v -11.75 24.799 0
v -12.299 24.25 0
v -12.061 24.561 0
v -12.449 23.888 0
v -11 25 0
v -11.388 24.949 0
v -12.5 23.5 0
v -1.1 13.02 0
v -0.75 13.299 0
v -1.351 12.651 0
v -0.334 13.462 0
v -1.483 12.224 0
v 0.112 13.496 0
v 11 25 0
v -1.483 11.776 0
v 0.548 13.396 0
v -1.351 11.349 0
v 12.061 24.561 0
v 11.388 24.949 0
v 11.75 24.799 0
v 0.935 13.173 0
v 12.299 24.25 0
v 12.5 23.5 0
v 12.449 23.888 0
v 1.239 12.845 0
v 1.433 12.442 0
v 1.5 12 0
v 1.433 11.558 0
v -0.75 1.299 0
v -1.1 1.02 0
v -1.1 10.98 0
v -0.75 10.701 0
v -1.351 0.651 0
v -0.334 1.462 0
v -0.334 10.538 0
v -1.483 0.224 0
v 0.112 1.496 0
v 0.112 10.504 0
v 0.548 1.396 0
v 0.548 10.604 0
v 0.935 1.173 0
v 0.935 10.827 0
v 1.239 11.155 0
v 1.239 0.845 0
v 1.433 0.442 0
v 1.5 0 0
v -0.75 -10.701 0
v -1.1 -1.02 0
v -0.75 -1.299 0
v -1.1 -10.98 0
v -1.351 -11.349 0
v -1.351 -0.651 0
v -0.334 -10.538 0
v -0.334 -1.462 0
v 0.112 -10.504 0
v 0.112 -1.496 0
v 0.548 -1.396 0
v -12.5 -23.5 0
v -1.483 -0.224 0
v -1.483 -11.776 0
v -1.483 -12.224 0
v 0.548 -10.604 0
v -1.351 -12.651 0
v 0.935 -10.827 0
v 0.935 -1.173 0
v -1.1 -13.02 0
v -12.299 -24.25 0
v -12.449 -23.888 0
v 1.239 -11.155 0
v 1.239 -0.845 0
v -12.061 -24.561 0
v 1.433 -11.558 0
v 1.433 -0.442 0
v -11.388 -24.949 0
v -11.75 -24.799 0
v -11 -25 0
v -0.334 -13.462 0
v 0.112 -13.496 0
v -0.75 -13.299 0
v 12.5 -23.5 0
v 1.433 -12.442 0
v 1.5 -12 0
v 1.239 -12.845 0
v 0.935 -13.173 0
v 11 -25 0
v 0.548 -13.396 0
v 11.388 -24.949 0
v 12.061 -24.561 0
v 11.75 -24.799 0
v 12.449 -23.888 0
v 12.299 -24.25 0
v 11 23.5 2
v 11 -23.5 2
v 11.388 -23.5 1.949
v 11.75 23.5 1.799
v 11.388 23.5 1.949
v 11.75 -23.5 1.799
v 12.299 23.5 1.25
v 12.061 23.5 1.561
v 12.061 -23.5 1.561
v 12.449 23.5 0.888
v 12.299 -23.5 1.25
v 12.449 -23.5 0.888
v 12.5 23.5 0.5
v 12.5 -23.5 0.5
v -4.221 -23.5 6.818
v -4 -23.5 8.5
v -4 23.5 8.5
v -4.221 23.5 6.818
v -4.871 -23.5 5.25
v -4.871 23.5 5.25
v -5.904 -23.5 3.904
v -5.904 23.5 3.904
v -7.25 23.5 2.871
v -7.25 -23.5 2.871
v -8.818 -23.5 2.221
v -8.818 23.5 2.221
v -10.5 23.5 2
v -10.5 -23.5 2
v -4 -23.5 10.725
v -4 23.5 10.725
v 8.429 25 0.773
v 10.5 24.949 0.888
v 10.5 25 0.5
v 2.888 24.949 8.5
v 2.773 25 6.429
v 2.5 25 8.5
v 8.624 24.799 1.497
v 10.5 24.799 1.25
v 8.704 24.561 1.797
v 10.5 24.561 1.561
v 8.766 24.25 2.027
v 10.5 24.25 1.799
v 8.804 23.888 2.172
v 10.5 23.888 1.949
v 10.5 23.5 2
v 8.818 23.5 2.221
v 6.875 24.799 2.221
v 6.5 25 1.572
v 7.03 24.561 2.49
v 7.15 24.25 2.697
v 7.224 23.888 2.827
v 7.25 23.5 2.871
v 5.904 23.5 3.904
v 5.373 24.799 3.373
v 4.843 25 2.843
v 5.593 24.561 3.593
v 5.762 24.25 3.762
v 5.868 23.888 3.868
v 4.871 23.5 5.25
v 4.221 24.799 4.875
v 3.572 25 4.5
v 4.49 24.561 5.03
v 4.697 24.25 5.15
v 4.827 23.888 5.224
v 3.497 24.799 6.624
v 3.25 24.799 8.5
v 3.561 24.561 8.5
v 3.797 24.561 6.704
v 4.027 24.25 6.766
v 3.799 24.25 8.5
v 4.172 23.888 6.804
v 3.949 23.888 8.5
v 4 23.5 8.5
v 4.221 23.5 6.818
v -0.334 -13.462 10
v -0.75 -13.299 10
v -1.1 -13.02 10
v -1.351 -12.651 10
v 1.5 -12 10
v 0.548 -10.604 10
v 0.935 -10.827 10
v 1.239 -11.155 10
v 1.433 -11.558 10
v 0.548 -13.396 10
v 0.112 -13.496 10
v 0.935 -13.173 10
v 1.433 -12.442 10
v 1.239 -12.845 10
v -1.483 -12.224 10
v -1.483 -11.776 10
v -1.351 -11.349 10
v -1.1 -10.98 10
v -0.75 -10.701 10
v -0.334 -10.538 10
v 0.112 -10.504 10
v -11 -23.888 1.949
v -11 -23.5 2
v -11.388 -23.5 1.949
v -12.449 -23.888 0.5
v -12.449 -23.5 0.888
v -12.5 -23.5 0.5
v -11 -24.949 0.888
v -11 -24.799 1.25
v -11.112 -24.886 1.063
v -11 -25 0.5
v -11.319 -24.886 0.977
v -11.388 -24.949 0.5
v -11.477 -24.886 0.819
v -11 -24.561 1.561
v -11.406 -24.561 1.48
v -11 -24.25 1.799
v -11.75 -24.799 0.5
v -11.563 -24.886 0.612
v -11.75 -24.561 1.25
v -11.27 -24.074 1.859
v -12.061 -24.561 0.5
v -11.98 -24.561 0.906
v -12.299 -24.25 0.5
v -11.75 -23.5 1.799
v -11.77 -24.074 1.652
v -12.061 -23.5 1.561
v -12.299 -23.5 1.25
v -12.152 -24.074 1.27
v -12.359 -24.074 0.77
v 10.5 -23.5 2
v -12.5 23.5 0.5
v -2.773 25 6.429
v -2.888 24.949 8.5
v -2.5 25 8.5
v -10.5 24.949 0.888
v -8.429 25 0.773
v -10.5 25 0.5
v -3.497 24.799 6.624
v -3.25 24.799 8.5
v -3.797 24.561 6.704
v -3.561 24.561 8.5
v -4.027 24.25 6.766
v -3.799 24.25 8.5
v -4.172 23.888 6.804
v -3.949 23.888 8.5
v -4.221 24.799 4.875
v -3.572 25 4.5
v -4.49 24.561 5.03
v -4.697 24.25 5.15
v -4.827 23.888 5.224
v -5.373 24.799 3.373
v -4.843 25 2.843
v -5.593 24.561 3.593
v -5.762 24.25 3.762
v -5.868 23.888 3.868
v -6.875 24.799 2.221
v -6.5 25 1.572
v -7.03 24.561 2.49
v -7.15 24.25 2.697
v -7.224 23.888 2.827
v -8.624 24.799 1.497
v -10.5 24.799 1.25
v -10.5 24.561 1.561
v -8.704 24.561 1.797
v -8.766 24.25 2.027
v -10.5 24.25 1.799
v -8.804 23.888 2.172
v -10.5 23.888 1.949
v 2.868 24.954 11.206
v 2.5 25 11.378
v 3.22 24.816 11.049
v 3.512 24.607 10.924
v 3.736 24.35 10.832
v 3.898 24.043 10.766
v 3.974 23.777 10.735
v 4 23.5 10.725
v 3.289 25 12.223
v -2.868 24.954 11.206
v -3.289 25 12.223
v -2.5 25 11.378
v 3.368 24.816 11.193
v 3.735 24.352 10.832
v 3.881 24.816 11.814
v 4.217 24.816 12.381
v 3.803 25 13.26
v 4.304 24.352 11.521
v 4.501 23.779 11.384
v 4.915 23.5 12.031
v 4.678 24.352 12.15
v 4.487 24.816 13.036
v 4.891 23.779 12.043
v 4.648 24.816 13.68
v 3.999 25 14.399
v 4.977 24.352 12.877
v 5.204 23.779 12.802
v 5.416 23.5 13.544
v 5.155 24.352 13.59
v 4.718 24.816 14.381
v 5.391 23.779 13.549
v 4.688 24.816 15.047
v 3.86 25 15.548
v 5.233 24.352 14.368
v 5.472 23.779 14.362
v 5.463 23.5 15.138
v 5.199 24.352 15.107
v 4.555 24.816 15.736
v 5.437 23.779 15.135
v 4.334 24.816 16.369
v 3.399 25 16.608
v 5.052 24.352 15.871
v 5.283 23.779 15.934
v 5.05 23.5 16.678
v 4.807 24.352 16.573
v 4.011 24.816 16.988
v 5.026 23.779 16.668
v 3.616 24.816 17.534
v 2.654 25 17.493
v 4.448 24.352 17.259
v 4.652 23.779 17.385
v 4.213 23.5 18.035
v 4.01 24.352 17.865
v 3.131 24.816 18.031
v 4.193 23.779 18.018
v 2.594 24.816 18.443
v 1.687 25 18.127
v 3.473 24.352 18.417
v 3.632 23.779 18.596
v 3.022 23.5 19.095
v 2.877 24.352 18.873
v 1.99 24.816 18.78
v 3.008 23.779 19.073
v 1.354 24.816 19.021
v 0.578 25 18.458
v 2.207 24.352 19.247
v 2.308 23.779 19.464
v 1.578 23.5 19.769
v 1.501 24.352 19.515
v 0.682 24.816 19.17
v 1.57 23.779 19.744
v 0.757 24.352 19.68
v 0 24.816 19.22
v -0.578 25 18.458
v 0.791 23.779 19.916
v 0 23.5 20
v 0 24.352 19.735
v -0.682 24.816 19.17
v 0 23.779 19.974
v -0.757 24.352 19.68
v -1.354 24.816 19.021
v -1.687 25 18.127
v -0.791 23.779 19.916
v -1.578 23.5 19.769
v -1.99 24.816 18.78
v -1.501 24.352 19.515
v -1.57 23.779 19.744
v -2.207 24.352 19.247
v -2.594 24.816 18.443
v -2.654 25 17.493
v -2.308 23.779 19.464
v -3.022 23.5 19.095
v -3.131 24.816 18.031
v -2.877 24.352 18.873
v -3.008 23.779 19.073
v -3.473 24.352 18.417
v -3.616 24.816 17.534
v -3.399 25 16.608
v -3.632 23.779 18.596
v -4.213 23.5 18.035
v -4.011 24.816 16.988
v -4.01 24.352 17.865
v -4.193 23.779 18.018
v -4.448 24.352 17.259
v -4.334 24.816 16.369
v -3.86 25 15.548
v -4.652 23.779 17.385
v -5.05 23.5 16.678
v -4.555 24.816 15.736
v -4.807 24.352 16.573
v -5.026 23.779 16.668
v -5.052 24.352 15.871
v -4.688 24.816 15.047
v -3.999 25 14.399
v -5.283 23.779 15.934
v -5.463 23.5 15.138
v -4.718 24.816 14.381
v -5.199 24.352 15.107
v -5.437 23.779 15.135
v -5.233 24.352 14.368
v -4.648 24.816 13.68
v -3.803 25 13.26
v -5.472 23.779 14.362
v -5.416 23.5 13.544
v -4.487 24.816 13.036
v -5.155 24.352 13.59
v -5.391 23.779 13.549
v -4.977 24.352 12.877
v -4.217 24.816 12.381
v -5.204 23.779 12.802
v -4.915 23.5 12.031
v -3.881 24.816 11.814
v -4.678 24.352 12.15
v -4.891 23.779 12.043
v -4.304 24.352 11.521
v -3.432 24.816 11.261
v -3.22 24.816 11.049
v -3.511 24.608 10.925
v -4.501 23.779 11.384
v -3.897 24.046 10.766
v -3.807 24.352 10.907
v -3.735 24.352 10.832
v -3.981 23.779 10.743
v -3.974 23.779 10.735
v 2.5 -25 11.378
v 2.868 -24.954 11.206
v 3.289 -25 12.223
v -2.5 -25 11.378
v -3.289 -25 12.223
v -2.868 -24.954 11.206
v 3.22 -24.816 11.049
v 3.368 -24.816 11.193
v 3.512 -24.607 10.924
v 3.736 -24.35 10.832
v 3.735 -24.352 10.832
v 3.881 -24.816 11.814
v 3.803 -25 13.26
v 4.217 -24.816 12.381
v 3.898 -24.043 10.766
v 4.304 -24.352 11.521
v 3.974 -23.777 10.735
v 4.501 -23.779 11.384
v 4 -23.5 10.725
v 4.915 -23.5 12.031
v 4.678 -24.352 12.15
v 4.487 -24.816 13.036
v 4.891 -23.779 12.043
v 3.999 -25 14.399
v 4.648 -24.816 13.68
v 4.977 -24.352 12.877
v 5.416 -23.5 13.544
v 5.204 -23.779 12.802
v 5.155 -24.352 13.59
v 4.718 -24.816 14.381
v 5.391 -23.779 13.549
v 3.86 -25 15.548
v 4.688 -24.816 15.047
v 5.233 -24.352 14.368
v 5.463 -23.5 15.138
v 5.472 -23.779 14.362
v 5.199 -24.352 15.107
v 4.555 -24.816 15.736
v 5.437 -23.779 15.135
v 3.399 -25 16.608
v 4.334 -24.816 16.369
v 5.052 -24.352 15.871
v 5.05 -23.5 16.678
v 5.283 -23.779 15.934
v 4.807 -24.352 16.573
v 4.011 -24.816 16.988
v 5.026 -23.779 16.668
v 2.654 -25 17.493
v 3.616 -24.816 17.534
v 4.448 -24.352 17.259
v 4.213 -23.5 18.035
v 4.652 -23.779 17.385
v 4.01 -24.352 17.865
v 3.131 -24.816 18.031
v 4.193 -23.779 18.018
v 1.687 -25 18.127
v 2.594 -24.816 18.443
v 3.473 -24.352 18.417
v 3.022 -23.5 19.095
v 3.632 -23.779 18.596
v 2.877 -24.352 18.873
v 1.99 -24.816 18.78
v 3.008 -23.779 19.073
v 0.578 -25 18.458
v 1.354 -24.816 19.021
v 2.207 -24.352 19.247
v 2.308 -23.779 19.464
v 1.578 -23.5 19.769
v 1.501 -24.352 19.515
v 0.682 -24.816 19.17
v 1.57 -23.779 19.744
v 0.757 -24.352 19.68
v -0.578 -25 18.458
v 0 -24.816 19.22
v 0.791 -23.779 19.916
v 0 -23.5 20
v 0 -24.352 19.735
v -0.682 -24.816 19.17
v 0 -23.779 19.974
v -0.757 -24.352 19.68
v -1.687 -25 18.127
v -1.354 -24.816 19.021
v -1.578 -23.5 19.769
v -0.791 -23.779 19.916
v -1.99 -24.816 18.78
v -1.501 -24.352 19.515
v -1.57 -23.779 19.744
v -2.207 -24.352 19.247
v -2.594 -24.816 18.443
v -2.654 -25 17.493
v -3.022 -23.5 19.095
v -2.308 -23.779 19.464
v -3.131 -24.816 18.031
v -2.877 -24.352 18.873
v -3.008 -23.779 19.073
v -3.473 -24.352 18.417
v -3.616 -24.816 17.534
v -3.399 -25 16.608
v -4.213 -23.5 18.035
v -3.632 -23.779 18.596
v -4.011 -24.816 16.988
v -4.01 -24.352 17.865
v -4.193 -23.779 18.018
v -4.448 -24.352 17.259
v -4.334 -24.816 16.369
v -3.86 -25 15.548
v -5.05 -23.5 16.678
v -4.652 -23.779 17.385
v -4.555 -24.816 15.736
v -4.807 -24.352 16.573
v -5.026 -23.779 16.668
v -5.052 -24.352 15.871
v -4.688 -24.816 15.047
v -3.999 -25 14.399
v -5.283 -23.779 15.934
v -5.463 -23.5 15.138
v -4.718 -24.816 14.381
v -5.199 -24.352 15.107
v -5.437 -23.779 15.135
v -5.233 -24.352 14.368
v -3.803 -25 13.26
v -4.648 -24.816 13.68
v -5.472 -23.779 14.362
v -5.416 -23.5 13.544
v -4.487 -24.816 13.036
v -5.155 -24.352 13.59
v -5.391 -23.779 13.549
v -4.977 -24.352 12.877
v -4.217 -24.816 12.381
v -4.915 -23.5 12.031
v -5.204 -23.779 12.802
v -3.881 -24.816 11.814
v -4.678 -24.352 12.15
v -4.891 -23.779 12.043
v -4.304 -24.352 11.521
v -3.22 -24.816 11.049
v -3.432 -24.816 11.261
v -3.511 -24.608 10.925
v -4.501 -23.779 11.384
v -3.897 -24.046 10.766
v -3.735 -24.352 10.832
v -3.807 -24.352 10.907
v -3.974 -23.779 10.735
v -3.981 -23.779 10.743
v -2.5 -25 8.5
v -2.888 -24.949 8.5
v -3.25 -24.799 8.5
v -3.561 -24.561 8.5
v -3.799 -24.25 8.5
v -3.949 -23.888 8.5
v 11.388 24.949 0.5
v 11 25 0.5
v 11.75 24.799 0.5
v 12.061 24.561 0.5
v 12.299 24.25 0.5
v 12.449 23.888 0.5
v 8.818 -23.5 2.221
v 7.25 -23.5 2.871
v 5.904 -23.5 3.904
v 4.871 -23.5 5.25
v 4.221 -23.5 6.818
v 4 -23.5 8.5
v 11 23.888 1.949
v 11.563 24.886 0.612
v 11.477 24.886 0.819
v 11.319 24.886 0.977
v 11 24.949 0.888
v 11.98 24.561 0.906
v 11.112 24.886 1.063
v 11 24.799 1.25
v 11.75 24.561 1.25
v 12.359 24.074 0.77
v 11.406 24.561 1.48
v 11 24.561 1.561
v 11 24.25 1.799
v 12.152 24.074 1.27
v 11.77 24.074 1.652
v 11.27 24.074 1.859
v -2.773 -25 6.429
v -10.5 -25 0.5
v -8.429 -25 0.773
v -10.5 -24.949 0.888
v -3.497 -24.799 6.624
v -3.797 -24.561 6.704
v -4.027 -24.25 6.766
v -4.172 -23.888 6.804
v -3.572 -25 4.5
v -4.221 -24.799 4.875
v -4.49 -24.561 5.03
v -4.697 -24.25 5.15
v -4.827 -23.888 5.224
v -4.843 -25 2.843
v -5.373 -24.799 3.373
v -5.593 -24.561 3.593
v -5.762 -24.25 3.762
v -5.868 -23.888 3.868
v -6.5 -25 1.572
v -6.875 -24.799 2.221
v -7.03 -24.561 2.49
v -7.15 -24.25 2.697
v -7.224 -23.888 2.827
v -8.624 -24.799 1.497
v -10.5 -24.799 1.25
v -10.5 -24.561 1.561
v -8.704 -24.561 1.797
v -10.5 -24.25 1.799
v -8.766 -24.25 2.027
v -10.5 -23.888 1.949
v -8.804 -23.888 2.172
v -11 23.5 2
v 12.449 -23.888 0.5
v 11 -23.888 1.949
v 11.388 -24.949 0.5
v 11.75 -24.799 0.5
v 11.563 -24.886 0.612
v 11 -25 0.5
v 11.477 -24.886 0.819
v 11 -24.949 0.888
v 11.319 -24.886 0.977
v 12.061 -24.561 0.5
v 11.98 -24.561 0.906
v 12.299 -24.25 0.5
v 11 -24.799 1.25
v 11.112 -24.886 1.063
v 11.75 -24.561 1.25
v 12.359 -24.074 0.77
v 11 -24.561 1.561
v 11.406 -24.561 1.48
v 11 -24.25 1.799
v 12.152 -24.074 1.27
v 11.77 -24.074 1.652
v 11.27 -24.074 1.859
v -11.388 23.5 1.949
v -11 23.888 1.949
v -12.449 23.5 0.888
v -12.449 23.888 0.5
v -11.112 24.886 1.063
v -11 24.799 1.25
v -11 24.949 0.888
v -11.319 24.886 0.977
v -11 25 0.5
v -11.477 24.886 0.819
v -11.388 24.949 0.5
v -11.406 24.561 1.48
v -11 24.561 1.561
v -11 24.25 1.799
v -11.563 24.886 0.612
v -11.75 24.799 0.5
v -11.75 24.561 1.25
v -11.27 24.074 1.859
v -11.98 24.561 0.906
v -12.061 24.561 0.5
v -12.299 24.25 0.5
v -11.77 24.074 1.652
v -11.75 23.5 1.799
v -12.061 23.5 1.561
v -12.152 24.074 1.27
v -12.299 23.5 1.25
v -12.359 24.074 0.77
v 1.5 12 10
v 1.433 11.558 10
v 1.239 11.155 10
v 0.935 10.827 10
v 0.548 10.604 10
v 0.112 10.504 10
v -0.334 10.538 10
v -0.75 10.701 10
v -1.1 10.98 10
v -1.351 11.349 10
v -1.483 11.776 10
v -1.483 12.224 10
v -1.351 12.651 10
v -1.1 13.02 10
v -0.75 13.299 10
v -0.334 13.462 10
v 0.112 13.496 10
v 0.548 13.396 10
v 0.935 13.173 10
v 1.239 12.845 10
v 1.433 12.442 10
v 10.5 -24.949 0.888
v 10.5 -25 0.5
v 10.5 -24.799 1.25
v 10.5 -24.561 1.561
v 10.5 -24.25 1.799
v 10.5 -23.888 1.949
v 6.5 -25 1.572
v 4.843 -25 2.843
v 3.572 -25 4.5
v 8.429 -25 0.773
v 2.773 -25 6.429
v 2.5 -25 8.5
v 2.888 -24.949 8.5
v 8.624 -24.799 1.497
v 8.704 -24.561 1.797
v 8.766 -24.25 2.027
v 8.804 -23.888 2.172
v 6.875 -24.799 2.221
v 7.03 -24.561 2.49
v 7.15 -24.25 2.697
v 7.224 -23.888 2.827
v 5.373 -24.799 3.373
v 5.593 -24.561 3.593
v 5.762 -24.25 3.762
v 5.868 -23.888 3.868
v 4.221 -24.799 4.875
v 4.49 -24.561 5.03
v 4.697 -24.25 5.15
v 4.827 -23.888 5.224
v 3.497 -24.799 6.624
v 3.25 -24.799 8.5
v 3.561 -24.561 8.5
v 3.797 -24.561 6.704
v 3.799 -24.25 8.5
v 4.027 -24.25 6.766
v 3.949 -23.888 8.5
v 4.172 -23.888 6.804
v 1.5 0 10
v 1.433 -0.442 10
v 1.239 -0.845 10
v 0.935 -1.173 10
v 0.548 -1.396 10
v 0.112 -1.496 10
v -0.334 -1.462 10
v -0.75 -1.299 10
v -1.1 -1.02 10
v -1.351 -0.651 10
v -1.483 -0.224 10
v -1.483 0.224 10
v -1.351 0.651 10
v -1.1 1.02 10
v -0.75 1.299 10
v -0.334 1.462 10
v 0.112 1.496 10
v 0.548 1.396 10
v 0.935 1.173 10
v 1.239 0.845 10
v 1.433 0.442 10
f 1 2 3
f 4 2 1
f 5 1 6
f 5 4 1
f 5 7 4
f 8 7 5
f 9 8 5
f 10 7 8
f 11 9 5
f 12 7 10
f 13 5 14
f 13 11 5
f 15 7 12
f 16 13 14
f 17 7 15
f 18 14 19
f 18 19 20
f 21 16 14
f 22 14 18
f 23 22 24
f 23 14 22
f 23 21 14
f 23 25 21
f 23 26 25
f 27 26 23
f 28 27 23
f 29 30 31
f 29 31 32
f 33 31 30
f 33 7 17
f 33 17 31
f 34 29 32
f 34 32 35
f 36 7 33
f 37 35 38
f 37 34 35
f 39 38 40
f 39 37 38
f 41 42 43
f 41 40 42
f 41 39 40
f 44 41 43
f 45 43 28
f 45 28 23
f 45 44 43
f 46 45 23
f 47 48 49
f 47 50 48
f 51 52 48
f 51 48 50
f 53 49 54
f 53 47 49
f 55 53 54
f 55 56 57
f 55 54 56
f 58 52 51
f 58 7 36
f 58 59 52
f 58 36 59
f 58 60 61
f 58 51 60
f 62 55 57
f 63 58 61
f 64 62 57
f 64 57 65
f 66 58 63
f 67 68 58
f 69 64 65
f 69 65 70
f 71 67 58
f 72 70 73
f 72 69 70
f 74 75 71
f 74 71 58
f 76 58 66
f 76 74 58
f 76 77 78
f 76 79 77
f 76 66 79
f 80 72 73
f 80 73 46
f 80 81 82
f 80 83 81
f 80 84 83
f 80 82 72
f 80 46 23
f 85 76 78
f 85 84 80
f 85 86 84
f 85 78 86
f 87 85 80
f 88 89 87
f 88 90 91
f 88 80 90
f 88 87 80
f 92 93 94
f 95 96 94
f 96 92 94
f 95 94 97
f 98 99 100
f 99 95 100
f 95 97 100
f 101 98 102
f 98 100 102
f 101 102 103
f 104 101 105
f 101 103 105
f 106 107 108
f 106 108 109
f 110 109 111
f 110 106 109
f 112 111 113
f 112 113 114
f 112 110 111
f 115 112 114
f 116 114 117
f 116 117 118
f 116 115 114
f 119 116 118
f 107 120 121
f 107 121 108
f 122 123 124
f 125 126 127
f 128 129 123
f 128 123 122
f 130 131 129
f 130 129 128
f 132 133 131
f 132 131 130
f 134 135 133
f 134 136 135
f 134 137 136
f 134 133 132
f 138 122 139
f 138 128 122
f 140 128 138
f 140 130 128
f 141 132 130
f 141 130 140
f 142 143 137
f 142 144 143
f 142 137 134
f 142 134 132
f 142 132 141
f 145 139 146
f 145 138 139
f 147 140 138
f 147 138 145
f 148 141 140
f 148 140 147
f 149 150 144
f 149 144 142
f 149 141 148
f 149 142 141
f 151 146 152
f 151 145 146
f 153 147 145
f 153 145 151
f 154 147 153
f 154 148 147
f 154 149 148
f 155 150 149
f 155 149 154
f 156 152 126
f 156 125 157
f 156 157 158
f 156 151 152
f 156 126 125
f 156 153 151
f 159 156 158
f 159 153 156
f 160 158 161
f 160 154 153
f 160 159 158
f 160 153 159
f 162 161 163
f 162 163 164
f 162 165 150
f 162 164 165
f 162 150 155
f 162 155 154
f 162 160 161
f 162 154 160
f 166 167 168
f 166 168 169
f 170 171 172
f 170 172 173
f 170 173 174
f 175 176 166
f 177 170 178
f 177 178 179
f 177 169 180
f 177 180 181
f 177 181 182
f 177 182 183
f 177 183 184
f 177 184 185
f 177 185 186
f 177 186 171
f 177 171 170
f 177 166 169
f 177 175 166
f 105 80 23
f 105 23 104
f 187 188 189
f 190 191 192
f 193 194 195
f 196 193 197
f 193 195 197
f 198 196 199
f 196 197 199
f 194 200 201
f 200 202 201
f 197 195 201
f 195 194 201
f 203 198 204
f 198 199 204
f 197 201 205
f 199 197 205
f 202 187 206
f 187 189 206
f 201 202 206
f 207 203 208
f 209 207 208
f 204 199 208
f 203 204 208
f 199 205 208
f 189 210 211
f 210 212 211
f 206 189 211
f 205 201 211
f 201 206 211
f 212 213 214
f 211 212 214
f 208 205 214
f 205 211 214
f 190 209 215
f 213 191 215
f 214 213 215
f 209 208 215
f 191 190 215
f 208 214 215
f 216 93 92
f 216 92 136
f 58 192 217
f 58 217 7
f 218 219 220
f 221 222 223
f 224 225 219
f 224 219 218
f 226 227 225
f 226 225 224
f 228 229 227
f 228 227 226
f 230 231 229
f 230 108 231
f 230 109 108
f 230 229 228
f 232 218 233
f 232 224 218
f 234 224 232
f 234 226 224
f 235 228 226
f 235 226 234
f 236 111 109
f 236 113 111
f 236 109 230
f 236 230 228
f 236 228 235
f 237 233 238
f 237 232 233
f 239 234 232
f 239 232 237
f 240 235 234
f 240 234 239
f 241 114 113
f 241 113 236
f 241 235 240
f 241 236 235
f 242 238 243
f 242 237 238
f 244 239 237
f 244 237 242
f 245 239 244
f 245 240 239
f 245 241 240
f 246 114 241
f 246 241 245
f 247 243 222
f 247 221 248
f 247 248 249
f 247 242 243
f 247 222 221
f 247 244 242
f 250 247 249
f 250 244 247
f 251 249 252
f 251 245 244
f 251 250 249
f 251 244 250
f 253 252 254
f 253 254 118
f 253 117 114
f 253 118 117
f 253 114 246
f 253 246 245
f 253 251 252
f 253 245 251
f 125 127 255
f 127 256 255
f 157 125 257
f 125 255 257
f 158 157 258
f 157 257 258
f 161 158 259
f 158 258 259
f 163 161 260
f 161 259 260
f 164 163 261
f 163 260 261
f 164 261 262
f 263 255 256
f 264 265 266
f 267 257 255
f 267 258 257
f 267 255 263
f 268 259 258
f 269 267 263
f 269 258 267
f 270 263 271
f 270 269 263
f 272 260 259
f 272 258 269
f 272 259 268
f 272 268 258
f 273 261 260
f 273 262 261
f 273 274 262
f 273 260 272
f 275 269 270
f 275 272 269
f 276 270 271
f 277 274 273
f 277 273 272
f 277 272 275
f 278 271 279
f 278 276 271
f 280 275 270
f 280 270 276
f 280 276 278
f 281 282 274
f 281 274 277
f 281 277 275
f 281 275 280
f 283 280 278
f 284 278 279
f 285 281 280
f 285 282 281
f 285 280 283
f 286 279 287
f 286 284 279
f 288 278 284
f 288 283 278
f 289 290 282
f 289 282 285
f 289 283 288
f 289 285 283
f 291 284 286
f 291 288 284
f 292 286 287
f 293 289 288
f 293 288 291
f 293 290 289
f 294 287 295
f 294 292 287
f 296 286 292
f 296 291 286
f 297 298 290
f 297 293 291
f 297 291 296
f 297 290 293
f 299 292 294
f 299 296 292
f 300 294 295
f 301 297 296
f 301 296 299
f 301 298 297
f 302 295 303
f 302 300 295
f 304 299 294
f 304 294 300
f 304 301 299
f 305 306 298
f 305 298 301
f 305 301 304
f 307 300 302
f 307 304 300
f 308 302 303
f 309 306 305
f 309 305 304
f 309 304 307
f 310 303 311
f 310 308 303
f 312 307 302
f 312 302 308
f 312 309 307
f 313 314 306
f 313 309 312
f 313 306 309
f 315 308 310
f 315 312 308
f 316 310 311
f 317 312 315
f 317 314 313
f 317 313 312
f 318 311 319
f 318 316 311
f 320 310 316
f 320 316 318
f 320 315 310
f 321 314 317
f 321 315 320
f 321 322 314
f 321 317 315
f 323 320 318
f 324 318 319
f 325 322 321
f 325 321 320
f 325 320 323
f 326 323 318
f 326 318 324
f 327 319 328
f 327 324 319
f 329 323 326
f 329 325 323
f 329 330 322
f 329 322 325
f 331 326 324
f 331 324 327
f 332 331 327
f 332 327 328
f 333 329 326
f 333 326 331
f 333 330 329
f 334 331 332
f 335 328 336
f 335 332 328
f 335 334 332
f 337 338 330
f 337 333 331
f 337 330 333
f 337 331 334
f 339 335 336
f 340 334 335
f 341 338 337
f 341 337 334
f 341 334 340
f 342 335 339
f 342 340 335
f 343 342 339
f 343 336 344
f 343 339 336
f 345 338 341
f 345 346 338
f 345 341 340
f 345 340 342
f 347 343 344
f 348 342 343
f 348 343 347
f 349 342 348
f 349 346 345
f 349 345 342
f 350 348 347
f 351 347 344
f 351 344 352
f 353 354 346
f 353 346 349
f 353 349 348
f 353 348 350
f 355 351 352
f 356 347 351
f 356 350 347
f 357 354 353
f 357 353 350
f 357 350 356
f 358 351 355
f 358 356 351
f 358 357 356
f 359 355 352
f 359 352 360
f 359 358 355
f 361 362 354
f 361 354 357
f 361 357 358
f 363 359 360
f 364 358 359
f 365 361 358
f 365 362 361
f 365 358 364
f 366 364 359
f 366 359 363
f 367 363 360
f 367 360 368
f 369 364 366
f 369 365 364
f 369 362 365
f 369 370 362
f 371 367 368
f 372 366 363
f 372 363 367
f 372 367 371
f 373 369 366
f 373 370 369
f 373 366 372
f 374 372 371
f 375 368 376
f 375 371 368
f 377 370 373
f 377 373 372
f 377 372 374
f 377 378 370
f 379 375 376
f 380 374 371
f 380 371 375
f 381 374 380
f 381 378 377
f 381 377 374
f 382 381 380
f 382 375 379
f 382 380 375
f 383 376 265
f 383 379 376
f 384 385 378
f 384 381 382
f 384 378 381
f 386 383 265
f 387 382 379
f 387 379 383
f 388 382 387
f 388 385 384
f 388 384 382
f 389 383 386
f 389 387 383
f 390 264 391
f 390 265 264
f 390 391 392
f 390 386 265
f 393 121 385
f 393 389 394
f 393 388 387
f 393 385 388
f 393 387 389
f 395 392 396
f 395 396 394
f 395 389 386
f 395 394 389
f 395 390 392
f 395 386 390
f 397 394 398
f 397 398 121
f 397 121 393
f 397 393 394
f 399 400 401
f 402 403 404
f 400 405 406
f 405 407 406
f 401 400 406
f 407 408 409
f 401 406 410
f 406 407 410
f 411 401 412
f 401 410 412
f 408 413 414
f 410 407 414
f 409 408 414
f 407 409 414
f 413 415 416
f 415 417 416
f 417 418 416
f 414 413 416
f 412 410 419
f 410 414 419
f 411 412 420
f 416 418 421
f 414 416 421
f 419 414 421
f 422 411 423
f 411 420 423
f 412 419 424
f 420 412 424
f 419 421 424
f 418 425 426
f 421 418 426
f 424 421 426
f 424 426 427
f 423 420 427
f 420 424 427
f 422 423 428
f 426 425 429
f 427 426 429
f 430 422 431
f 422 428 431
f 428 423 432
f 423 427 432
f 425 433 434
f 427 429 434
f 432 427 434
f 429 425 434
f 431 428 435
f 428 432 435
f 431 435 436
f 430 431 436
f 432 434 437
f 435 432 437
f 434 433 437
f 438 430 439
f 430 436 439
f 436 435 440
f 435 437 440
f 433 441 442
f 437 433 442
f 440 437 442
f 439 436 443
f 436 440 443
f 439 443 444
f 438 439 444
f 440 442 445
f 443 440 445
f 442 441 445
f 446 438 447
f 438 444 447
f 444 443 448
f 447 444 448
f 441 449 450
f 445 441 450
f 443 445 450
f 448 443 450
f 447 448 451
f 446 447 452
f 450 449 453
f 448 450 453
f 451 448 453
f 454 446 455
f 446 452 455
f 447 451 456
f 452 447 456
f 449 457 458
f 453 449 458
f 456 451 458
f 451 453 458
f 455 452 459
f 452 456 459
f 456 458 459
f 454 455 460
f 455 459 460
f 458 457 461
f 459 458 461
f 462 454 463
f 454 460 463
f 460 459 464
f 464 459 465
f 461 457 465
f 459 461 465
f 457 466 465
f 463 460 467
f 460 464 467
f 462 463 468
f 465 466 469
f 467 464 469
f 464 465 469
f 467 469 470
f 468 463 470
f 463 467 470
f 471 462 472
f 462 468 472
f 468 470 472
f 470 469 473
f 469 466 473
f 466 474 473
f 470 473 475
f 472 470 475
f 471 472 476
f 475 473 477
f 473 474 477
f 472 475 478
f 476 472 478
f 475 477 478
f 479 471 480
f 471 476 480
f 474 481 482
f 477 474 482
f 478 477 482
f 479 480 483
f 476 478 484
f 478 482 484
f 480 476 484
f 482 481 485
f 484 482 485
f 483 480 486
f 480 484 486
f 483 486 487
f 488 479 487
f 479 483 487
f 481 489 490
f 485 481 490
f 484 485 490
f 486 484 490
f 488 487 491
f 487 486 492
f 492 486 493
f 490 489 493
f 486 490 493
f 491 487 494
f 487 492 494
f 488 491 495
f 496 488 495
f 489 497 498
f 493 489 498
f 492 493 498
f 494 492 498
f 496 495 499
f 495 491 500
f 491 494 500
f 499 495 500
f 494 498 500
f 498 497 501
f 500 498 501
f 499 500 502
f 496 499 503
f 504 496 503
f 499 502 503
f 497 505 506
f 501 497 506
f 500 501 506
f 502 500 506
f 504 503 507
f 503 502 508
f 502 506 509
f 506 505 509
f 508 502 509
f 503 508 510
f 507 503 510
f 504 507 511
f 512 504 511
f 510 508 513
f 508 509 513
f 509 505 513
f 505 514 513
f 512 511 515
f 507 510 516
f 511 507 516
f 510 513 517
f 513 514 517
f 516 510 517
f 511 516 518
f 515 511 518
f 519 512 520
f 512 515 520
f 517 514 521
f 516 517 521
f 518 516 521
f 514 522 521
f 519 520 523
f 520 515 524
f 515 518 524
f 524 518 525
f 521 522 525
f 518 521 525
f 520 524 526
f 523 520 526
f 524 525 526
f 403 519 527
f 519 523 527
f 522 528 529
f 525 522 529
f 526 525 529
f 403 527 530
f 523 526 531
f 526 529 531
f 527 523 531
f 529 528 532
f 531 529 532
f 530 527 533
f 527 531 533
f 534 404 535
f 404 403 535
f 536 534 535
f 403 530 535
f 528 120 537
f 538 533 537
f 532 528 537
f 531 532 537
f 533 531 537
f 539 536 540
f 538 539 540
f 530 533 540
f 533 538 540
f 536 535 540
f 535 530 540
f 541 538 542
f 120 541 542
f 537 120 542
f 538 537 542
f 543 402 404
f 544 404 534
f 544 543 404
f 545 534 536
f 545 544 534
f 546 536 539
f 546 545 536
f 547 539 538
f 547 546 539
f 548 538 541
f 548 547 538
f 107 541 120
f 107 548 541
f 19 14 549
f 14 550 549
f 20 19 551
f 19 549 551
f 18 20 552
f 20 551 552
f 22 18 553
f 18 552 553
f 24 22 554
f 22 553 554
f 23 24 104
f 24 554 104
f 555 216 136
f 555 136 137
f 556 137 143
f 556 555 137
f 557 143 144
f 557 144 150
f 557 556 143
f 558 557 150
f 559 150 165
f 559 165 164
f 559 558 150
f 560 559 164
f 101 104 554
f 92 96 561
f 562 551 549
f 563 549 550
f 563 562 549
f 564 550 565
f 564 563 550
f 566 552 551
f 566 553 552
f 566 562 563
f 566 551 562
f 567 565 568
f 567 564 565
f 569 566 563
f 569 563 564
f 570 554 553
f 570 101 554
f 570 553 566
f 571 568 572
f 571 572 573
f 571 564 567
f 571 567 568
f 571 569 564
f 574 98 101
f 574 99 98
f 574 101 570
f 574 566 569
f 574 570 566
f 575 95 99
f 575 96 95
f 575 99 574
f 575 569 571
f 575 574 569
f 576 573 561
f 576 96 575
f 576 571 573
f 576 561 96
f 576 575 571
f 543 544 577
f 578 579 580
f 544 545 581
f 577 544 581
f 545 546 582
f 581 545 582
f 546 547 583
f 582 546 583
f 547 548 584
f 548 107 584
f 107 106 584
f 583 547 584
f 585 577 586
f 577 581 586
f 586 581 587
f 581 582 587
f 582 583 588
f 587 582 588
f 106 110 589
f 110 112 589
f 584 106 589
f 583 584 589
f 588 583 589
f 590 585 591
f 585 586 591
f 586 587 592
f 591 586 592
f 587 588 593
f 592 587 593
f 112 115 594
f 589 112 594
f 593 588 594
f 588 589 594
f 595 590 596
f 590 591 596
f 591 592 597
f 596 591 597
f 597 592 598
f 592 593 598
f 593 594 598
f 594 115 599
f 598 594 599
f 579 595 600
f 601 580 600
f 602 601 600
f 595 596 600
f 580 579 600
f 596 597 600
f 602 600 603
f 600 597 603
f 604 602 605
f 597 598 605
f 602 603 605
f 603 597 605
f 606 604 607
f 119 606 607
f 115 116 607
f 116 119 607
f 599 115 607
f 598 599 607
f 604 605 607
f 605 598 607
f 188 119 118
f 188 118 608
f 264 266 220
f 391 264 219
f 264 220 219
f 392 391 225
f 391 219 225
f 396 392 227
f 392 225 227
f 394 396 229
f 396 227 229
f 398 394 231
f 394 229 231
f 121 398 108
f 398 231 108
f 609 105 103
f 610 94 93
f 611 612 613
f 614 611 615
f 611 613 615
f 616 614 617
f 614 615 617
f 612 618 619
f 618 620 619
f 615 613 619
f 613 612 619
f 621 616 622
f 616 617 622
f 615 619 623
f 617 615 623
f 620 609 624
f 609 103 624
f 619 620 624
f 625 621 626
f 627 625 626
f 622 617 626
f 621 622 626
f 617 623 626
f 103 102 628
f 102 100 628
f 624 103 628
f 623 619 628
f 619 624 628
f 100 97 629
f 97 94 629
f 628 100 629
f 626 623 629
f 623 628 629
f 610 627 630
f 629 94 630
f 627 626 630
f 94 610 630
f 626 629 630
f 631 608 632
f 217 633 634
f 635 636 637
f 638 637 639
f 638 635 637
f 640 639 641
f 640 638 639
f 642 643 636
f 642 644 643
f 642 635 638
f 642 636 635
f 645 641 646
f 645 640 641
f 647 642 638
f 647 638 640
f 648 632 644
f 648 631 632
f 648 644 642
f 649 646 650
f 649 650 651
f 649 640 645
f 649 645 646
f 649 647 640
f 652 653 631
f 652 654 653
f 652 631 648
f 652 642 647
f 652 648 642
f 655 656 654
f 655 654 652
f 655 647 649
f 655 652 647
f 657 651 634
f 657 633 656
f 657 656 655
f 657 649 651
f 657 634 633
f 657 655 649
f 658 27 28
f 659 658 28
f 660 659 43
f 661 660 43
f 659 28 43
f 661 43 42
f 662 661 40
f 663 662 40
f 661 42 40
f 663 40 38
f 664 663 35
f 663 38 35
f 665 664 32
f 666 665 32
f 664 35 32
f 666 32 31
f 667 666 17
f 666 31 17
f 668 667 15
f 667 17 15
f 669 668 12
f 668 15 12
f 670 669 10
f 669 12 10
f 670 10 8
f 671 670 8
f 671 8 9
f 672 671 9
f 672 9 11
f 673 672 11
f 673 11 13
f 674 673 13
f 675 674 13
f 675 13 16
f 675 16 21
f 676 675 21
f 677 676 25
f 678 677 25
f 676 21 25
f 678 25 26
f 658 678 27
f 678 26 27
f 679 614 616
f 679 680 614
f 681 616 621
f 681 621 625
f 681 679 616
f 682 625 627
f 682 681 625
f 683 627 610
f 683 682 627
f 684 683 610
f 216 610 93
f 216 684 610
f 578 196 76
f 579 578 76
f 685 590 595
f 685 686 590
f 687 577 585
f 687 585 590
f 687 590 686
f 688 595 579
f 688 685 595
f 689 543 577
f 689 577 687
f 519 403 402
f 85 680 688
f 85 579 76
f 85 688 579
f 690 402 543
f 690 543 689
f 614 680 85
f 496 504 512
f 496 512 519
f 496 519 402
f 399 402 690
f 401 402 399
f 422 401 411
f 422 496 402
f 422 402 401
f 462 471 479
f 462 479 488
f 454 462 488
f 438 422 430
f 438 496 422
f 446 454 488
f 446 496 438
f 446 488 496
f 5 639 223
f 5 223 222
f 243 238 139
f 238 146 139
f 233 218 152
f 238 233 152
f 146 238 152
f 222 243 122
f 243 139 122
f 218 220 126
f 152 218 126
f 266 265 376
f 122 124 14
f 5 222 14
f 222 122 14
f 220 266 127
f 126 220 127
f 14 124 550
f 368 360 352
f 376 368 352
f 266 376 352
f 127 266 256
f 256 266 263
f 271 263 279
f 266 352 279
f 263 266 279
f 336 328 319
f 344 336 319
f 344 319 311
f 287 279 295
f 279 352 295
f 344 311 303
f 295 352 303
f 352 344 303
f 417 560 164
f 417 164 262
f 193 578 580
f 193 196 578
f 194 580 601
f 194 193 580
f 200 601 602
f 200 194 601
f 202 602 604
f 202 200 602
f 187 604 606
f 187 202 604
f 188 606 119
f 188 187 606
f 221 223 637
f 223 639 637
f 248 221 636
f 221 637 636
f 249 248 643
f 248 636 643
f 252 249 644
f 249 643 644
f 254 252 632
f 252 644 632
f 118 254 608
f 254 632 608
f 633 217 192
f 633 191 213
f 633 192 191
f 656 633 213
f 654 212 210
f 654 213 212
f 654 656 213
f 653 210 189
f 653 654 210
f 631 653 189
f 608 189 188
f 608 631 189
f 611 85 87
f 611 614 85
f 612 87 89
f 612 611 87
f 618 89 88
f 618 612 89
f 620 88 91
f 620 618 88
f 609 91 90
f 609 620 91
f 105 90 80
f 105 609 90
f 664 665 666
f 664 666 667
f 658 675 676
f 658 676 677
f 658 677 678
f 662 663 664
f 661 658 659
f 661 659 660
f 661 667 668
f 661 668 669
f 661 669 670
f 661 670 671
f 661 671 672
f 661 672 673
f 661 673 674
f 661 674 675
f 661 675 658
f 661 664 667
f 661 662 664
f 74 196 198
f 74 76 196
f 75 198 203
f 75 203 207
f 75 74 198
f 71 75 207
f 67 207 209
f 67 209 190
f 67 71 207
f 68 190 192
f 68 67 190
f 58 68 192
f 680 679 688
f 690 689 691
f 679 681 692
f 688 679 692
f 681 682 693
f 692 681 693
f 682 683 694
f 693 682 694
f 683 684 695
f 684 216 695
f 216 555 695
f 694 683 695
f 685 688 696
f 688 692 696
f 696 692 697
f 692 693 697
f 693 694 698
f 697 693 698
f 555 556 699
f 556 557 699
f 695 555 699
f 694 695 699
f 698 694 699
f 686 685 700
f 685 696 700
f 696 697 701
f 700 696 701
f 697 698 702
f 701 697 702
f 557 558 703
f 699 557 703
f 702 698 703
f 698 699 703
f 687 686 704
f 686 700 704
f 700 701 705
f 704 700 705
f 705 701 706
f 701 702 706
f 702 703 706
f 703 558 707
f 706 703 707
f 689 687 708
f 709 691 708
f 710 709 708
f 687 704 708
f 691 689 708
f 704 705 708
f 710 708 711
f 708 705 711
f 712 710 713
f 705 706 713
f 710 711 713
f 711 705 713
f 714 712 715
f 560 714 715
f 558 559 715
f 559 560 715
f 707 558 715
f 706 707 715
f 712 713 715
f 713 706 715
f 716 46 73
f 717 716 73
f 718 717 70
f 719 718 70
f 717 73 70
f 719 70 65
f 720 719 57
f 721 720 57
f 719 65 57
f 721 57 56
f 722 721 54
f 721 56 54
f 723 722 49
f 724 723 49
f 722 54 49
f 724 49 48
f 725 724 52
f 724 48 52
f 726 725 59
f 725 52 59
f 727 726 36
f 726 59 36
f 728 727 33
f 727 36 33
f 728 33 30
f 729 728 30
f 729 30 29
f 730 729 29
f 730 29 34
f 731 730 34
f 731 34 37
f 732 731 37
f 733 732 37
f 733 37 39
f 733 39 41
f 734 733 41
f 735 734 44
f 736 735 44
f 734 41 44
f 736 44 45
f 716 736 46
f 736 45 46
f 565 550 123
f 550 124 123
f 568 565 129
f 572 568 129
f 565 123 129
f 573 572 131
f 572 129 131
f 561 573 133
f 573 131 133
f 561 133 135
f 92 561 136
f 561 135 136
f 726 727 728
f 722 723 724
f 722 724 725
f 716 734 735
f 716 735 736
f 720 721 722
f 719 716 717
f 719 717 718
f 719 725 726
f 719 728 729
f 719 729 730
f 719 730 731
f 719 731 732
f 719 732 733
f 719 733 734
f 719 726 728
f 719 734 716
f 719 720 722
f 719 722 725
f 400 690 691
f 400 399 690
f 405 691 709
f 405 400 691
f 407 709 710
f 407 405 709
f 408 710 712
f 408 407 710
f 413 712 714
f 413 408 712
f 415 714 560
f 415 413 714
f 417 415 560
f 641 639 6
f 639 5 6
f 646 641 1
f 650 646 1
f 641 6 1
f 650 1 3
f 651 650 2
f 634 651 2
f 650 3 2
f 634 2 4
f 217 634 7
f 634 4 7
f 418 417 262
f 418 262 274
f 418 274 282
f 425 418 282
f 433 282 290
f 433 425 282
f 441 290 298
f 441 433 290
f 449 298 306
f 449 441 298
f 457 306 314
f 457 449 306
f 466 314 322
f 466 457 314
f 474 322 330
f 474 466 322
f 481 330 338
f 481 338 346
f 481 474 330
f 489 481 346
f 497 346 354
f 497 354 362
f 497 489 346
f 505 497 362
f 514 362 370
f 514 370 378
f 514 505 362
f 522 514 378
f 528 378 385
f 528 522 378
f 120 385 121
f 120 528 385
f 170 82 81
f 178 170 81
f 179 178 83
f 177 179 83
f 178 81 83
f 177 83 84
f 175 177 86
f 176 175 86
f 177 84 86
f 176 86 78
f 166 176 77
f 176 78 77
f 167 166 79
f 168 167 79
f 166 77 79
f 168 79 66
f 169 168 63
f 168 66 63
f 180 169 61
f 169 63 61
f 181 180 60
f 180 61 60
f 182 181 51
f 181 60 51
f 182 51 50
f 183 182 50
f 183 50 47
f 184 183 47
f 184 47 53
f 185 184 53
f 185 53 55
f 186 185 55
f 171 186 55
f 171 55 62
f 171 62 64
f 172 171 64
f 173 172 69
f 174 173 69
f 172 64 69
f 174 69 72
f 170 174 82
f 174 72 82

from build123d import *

# Parameters (mm, degrees)
F1_DEPTH = 25
F2_R     = 1.5
F3_R     = 1.5
F4_R     = 1.5
F5_DEPTH = 10


with BuildPart() as f1:
    # F0 (on Front) → F1 (new body, symmetric)
    with BuildSketch(Plane.XZ):
        with BuildLine():
            Line((-12.5, 2), (-12.5, 0))
            Line((-12.5, 0), (12.5, 0))
            Line((12.5, 0), (12.5, 2))
            Line((12.5, 2), (10.5, 2))
            ThreePointArc((10.5, 2), (5.9038059223, 3.9038059223), (4, 8.5))
            Line((4, 8.5), (4, 10.7250827824))
            ThreePointArc((4, 10.7250827824), (0, 20), (-4, 10.7250827824))
            Line((-4, 10.7250827824), (-4, 8.5))
            ThreePointArc((-4, 8.5), (-5.9038059223, 3.9038059223), (-10.5, 2))
            Line((-10.5, 2), (-12.5, 2))
        make_face()
    extrude(amount=F1_DEPTH, both=True)

    # F2
    f2_edges = [f1.edges().sort_by_distance(p)[0] for p in [
        (12.5, 0, 2),
        (-12.5, 0, 2),
    ]]
    fillet(f2_edges, radius=F2_R)

    # F3
    f3_edges = [f1.edges().sort_by_distance(p)[0] for p in [
        (0, -25, 20),
        (4, -25, 9.612541),
        (-4, -25, 9.612541),
        (0, 25, 20),
        (4, 25, 9.612541),
        (-5.903806, 25, 3.903806),
    ]]
    fillet(f3_edges, radius=F3_R)

    # F4 (on face) → F5 (cut)
    with BuildSketch(Plane(origin=(0, 0, 0), x_dir=(1, 0, 0), z_dir=(0, 0, -1))):
        Circle(F4_R)
        with Locations((0, 12)):
            Circle(F4_R)
        with Locations((0, -12)):
            Circle(F4_R)
    extrude(amount=-F5_DEPTH, mode=Mode.SUBTRACT)


solid = f1.part
